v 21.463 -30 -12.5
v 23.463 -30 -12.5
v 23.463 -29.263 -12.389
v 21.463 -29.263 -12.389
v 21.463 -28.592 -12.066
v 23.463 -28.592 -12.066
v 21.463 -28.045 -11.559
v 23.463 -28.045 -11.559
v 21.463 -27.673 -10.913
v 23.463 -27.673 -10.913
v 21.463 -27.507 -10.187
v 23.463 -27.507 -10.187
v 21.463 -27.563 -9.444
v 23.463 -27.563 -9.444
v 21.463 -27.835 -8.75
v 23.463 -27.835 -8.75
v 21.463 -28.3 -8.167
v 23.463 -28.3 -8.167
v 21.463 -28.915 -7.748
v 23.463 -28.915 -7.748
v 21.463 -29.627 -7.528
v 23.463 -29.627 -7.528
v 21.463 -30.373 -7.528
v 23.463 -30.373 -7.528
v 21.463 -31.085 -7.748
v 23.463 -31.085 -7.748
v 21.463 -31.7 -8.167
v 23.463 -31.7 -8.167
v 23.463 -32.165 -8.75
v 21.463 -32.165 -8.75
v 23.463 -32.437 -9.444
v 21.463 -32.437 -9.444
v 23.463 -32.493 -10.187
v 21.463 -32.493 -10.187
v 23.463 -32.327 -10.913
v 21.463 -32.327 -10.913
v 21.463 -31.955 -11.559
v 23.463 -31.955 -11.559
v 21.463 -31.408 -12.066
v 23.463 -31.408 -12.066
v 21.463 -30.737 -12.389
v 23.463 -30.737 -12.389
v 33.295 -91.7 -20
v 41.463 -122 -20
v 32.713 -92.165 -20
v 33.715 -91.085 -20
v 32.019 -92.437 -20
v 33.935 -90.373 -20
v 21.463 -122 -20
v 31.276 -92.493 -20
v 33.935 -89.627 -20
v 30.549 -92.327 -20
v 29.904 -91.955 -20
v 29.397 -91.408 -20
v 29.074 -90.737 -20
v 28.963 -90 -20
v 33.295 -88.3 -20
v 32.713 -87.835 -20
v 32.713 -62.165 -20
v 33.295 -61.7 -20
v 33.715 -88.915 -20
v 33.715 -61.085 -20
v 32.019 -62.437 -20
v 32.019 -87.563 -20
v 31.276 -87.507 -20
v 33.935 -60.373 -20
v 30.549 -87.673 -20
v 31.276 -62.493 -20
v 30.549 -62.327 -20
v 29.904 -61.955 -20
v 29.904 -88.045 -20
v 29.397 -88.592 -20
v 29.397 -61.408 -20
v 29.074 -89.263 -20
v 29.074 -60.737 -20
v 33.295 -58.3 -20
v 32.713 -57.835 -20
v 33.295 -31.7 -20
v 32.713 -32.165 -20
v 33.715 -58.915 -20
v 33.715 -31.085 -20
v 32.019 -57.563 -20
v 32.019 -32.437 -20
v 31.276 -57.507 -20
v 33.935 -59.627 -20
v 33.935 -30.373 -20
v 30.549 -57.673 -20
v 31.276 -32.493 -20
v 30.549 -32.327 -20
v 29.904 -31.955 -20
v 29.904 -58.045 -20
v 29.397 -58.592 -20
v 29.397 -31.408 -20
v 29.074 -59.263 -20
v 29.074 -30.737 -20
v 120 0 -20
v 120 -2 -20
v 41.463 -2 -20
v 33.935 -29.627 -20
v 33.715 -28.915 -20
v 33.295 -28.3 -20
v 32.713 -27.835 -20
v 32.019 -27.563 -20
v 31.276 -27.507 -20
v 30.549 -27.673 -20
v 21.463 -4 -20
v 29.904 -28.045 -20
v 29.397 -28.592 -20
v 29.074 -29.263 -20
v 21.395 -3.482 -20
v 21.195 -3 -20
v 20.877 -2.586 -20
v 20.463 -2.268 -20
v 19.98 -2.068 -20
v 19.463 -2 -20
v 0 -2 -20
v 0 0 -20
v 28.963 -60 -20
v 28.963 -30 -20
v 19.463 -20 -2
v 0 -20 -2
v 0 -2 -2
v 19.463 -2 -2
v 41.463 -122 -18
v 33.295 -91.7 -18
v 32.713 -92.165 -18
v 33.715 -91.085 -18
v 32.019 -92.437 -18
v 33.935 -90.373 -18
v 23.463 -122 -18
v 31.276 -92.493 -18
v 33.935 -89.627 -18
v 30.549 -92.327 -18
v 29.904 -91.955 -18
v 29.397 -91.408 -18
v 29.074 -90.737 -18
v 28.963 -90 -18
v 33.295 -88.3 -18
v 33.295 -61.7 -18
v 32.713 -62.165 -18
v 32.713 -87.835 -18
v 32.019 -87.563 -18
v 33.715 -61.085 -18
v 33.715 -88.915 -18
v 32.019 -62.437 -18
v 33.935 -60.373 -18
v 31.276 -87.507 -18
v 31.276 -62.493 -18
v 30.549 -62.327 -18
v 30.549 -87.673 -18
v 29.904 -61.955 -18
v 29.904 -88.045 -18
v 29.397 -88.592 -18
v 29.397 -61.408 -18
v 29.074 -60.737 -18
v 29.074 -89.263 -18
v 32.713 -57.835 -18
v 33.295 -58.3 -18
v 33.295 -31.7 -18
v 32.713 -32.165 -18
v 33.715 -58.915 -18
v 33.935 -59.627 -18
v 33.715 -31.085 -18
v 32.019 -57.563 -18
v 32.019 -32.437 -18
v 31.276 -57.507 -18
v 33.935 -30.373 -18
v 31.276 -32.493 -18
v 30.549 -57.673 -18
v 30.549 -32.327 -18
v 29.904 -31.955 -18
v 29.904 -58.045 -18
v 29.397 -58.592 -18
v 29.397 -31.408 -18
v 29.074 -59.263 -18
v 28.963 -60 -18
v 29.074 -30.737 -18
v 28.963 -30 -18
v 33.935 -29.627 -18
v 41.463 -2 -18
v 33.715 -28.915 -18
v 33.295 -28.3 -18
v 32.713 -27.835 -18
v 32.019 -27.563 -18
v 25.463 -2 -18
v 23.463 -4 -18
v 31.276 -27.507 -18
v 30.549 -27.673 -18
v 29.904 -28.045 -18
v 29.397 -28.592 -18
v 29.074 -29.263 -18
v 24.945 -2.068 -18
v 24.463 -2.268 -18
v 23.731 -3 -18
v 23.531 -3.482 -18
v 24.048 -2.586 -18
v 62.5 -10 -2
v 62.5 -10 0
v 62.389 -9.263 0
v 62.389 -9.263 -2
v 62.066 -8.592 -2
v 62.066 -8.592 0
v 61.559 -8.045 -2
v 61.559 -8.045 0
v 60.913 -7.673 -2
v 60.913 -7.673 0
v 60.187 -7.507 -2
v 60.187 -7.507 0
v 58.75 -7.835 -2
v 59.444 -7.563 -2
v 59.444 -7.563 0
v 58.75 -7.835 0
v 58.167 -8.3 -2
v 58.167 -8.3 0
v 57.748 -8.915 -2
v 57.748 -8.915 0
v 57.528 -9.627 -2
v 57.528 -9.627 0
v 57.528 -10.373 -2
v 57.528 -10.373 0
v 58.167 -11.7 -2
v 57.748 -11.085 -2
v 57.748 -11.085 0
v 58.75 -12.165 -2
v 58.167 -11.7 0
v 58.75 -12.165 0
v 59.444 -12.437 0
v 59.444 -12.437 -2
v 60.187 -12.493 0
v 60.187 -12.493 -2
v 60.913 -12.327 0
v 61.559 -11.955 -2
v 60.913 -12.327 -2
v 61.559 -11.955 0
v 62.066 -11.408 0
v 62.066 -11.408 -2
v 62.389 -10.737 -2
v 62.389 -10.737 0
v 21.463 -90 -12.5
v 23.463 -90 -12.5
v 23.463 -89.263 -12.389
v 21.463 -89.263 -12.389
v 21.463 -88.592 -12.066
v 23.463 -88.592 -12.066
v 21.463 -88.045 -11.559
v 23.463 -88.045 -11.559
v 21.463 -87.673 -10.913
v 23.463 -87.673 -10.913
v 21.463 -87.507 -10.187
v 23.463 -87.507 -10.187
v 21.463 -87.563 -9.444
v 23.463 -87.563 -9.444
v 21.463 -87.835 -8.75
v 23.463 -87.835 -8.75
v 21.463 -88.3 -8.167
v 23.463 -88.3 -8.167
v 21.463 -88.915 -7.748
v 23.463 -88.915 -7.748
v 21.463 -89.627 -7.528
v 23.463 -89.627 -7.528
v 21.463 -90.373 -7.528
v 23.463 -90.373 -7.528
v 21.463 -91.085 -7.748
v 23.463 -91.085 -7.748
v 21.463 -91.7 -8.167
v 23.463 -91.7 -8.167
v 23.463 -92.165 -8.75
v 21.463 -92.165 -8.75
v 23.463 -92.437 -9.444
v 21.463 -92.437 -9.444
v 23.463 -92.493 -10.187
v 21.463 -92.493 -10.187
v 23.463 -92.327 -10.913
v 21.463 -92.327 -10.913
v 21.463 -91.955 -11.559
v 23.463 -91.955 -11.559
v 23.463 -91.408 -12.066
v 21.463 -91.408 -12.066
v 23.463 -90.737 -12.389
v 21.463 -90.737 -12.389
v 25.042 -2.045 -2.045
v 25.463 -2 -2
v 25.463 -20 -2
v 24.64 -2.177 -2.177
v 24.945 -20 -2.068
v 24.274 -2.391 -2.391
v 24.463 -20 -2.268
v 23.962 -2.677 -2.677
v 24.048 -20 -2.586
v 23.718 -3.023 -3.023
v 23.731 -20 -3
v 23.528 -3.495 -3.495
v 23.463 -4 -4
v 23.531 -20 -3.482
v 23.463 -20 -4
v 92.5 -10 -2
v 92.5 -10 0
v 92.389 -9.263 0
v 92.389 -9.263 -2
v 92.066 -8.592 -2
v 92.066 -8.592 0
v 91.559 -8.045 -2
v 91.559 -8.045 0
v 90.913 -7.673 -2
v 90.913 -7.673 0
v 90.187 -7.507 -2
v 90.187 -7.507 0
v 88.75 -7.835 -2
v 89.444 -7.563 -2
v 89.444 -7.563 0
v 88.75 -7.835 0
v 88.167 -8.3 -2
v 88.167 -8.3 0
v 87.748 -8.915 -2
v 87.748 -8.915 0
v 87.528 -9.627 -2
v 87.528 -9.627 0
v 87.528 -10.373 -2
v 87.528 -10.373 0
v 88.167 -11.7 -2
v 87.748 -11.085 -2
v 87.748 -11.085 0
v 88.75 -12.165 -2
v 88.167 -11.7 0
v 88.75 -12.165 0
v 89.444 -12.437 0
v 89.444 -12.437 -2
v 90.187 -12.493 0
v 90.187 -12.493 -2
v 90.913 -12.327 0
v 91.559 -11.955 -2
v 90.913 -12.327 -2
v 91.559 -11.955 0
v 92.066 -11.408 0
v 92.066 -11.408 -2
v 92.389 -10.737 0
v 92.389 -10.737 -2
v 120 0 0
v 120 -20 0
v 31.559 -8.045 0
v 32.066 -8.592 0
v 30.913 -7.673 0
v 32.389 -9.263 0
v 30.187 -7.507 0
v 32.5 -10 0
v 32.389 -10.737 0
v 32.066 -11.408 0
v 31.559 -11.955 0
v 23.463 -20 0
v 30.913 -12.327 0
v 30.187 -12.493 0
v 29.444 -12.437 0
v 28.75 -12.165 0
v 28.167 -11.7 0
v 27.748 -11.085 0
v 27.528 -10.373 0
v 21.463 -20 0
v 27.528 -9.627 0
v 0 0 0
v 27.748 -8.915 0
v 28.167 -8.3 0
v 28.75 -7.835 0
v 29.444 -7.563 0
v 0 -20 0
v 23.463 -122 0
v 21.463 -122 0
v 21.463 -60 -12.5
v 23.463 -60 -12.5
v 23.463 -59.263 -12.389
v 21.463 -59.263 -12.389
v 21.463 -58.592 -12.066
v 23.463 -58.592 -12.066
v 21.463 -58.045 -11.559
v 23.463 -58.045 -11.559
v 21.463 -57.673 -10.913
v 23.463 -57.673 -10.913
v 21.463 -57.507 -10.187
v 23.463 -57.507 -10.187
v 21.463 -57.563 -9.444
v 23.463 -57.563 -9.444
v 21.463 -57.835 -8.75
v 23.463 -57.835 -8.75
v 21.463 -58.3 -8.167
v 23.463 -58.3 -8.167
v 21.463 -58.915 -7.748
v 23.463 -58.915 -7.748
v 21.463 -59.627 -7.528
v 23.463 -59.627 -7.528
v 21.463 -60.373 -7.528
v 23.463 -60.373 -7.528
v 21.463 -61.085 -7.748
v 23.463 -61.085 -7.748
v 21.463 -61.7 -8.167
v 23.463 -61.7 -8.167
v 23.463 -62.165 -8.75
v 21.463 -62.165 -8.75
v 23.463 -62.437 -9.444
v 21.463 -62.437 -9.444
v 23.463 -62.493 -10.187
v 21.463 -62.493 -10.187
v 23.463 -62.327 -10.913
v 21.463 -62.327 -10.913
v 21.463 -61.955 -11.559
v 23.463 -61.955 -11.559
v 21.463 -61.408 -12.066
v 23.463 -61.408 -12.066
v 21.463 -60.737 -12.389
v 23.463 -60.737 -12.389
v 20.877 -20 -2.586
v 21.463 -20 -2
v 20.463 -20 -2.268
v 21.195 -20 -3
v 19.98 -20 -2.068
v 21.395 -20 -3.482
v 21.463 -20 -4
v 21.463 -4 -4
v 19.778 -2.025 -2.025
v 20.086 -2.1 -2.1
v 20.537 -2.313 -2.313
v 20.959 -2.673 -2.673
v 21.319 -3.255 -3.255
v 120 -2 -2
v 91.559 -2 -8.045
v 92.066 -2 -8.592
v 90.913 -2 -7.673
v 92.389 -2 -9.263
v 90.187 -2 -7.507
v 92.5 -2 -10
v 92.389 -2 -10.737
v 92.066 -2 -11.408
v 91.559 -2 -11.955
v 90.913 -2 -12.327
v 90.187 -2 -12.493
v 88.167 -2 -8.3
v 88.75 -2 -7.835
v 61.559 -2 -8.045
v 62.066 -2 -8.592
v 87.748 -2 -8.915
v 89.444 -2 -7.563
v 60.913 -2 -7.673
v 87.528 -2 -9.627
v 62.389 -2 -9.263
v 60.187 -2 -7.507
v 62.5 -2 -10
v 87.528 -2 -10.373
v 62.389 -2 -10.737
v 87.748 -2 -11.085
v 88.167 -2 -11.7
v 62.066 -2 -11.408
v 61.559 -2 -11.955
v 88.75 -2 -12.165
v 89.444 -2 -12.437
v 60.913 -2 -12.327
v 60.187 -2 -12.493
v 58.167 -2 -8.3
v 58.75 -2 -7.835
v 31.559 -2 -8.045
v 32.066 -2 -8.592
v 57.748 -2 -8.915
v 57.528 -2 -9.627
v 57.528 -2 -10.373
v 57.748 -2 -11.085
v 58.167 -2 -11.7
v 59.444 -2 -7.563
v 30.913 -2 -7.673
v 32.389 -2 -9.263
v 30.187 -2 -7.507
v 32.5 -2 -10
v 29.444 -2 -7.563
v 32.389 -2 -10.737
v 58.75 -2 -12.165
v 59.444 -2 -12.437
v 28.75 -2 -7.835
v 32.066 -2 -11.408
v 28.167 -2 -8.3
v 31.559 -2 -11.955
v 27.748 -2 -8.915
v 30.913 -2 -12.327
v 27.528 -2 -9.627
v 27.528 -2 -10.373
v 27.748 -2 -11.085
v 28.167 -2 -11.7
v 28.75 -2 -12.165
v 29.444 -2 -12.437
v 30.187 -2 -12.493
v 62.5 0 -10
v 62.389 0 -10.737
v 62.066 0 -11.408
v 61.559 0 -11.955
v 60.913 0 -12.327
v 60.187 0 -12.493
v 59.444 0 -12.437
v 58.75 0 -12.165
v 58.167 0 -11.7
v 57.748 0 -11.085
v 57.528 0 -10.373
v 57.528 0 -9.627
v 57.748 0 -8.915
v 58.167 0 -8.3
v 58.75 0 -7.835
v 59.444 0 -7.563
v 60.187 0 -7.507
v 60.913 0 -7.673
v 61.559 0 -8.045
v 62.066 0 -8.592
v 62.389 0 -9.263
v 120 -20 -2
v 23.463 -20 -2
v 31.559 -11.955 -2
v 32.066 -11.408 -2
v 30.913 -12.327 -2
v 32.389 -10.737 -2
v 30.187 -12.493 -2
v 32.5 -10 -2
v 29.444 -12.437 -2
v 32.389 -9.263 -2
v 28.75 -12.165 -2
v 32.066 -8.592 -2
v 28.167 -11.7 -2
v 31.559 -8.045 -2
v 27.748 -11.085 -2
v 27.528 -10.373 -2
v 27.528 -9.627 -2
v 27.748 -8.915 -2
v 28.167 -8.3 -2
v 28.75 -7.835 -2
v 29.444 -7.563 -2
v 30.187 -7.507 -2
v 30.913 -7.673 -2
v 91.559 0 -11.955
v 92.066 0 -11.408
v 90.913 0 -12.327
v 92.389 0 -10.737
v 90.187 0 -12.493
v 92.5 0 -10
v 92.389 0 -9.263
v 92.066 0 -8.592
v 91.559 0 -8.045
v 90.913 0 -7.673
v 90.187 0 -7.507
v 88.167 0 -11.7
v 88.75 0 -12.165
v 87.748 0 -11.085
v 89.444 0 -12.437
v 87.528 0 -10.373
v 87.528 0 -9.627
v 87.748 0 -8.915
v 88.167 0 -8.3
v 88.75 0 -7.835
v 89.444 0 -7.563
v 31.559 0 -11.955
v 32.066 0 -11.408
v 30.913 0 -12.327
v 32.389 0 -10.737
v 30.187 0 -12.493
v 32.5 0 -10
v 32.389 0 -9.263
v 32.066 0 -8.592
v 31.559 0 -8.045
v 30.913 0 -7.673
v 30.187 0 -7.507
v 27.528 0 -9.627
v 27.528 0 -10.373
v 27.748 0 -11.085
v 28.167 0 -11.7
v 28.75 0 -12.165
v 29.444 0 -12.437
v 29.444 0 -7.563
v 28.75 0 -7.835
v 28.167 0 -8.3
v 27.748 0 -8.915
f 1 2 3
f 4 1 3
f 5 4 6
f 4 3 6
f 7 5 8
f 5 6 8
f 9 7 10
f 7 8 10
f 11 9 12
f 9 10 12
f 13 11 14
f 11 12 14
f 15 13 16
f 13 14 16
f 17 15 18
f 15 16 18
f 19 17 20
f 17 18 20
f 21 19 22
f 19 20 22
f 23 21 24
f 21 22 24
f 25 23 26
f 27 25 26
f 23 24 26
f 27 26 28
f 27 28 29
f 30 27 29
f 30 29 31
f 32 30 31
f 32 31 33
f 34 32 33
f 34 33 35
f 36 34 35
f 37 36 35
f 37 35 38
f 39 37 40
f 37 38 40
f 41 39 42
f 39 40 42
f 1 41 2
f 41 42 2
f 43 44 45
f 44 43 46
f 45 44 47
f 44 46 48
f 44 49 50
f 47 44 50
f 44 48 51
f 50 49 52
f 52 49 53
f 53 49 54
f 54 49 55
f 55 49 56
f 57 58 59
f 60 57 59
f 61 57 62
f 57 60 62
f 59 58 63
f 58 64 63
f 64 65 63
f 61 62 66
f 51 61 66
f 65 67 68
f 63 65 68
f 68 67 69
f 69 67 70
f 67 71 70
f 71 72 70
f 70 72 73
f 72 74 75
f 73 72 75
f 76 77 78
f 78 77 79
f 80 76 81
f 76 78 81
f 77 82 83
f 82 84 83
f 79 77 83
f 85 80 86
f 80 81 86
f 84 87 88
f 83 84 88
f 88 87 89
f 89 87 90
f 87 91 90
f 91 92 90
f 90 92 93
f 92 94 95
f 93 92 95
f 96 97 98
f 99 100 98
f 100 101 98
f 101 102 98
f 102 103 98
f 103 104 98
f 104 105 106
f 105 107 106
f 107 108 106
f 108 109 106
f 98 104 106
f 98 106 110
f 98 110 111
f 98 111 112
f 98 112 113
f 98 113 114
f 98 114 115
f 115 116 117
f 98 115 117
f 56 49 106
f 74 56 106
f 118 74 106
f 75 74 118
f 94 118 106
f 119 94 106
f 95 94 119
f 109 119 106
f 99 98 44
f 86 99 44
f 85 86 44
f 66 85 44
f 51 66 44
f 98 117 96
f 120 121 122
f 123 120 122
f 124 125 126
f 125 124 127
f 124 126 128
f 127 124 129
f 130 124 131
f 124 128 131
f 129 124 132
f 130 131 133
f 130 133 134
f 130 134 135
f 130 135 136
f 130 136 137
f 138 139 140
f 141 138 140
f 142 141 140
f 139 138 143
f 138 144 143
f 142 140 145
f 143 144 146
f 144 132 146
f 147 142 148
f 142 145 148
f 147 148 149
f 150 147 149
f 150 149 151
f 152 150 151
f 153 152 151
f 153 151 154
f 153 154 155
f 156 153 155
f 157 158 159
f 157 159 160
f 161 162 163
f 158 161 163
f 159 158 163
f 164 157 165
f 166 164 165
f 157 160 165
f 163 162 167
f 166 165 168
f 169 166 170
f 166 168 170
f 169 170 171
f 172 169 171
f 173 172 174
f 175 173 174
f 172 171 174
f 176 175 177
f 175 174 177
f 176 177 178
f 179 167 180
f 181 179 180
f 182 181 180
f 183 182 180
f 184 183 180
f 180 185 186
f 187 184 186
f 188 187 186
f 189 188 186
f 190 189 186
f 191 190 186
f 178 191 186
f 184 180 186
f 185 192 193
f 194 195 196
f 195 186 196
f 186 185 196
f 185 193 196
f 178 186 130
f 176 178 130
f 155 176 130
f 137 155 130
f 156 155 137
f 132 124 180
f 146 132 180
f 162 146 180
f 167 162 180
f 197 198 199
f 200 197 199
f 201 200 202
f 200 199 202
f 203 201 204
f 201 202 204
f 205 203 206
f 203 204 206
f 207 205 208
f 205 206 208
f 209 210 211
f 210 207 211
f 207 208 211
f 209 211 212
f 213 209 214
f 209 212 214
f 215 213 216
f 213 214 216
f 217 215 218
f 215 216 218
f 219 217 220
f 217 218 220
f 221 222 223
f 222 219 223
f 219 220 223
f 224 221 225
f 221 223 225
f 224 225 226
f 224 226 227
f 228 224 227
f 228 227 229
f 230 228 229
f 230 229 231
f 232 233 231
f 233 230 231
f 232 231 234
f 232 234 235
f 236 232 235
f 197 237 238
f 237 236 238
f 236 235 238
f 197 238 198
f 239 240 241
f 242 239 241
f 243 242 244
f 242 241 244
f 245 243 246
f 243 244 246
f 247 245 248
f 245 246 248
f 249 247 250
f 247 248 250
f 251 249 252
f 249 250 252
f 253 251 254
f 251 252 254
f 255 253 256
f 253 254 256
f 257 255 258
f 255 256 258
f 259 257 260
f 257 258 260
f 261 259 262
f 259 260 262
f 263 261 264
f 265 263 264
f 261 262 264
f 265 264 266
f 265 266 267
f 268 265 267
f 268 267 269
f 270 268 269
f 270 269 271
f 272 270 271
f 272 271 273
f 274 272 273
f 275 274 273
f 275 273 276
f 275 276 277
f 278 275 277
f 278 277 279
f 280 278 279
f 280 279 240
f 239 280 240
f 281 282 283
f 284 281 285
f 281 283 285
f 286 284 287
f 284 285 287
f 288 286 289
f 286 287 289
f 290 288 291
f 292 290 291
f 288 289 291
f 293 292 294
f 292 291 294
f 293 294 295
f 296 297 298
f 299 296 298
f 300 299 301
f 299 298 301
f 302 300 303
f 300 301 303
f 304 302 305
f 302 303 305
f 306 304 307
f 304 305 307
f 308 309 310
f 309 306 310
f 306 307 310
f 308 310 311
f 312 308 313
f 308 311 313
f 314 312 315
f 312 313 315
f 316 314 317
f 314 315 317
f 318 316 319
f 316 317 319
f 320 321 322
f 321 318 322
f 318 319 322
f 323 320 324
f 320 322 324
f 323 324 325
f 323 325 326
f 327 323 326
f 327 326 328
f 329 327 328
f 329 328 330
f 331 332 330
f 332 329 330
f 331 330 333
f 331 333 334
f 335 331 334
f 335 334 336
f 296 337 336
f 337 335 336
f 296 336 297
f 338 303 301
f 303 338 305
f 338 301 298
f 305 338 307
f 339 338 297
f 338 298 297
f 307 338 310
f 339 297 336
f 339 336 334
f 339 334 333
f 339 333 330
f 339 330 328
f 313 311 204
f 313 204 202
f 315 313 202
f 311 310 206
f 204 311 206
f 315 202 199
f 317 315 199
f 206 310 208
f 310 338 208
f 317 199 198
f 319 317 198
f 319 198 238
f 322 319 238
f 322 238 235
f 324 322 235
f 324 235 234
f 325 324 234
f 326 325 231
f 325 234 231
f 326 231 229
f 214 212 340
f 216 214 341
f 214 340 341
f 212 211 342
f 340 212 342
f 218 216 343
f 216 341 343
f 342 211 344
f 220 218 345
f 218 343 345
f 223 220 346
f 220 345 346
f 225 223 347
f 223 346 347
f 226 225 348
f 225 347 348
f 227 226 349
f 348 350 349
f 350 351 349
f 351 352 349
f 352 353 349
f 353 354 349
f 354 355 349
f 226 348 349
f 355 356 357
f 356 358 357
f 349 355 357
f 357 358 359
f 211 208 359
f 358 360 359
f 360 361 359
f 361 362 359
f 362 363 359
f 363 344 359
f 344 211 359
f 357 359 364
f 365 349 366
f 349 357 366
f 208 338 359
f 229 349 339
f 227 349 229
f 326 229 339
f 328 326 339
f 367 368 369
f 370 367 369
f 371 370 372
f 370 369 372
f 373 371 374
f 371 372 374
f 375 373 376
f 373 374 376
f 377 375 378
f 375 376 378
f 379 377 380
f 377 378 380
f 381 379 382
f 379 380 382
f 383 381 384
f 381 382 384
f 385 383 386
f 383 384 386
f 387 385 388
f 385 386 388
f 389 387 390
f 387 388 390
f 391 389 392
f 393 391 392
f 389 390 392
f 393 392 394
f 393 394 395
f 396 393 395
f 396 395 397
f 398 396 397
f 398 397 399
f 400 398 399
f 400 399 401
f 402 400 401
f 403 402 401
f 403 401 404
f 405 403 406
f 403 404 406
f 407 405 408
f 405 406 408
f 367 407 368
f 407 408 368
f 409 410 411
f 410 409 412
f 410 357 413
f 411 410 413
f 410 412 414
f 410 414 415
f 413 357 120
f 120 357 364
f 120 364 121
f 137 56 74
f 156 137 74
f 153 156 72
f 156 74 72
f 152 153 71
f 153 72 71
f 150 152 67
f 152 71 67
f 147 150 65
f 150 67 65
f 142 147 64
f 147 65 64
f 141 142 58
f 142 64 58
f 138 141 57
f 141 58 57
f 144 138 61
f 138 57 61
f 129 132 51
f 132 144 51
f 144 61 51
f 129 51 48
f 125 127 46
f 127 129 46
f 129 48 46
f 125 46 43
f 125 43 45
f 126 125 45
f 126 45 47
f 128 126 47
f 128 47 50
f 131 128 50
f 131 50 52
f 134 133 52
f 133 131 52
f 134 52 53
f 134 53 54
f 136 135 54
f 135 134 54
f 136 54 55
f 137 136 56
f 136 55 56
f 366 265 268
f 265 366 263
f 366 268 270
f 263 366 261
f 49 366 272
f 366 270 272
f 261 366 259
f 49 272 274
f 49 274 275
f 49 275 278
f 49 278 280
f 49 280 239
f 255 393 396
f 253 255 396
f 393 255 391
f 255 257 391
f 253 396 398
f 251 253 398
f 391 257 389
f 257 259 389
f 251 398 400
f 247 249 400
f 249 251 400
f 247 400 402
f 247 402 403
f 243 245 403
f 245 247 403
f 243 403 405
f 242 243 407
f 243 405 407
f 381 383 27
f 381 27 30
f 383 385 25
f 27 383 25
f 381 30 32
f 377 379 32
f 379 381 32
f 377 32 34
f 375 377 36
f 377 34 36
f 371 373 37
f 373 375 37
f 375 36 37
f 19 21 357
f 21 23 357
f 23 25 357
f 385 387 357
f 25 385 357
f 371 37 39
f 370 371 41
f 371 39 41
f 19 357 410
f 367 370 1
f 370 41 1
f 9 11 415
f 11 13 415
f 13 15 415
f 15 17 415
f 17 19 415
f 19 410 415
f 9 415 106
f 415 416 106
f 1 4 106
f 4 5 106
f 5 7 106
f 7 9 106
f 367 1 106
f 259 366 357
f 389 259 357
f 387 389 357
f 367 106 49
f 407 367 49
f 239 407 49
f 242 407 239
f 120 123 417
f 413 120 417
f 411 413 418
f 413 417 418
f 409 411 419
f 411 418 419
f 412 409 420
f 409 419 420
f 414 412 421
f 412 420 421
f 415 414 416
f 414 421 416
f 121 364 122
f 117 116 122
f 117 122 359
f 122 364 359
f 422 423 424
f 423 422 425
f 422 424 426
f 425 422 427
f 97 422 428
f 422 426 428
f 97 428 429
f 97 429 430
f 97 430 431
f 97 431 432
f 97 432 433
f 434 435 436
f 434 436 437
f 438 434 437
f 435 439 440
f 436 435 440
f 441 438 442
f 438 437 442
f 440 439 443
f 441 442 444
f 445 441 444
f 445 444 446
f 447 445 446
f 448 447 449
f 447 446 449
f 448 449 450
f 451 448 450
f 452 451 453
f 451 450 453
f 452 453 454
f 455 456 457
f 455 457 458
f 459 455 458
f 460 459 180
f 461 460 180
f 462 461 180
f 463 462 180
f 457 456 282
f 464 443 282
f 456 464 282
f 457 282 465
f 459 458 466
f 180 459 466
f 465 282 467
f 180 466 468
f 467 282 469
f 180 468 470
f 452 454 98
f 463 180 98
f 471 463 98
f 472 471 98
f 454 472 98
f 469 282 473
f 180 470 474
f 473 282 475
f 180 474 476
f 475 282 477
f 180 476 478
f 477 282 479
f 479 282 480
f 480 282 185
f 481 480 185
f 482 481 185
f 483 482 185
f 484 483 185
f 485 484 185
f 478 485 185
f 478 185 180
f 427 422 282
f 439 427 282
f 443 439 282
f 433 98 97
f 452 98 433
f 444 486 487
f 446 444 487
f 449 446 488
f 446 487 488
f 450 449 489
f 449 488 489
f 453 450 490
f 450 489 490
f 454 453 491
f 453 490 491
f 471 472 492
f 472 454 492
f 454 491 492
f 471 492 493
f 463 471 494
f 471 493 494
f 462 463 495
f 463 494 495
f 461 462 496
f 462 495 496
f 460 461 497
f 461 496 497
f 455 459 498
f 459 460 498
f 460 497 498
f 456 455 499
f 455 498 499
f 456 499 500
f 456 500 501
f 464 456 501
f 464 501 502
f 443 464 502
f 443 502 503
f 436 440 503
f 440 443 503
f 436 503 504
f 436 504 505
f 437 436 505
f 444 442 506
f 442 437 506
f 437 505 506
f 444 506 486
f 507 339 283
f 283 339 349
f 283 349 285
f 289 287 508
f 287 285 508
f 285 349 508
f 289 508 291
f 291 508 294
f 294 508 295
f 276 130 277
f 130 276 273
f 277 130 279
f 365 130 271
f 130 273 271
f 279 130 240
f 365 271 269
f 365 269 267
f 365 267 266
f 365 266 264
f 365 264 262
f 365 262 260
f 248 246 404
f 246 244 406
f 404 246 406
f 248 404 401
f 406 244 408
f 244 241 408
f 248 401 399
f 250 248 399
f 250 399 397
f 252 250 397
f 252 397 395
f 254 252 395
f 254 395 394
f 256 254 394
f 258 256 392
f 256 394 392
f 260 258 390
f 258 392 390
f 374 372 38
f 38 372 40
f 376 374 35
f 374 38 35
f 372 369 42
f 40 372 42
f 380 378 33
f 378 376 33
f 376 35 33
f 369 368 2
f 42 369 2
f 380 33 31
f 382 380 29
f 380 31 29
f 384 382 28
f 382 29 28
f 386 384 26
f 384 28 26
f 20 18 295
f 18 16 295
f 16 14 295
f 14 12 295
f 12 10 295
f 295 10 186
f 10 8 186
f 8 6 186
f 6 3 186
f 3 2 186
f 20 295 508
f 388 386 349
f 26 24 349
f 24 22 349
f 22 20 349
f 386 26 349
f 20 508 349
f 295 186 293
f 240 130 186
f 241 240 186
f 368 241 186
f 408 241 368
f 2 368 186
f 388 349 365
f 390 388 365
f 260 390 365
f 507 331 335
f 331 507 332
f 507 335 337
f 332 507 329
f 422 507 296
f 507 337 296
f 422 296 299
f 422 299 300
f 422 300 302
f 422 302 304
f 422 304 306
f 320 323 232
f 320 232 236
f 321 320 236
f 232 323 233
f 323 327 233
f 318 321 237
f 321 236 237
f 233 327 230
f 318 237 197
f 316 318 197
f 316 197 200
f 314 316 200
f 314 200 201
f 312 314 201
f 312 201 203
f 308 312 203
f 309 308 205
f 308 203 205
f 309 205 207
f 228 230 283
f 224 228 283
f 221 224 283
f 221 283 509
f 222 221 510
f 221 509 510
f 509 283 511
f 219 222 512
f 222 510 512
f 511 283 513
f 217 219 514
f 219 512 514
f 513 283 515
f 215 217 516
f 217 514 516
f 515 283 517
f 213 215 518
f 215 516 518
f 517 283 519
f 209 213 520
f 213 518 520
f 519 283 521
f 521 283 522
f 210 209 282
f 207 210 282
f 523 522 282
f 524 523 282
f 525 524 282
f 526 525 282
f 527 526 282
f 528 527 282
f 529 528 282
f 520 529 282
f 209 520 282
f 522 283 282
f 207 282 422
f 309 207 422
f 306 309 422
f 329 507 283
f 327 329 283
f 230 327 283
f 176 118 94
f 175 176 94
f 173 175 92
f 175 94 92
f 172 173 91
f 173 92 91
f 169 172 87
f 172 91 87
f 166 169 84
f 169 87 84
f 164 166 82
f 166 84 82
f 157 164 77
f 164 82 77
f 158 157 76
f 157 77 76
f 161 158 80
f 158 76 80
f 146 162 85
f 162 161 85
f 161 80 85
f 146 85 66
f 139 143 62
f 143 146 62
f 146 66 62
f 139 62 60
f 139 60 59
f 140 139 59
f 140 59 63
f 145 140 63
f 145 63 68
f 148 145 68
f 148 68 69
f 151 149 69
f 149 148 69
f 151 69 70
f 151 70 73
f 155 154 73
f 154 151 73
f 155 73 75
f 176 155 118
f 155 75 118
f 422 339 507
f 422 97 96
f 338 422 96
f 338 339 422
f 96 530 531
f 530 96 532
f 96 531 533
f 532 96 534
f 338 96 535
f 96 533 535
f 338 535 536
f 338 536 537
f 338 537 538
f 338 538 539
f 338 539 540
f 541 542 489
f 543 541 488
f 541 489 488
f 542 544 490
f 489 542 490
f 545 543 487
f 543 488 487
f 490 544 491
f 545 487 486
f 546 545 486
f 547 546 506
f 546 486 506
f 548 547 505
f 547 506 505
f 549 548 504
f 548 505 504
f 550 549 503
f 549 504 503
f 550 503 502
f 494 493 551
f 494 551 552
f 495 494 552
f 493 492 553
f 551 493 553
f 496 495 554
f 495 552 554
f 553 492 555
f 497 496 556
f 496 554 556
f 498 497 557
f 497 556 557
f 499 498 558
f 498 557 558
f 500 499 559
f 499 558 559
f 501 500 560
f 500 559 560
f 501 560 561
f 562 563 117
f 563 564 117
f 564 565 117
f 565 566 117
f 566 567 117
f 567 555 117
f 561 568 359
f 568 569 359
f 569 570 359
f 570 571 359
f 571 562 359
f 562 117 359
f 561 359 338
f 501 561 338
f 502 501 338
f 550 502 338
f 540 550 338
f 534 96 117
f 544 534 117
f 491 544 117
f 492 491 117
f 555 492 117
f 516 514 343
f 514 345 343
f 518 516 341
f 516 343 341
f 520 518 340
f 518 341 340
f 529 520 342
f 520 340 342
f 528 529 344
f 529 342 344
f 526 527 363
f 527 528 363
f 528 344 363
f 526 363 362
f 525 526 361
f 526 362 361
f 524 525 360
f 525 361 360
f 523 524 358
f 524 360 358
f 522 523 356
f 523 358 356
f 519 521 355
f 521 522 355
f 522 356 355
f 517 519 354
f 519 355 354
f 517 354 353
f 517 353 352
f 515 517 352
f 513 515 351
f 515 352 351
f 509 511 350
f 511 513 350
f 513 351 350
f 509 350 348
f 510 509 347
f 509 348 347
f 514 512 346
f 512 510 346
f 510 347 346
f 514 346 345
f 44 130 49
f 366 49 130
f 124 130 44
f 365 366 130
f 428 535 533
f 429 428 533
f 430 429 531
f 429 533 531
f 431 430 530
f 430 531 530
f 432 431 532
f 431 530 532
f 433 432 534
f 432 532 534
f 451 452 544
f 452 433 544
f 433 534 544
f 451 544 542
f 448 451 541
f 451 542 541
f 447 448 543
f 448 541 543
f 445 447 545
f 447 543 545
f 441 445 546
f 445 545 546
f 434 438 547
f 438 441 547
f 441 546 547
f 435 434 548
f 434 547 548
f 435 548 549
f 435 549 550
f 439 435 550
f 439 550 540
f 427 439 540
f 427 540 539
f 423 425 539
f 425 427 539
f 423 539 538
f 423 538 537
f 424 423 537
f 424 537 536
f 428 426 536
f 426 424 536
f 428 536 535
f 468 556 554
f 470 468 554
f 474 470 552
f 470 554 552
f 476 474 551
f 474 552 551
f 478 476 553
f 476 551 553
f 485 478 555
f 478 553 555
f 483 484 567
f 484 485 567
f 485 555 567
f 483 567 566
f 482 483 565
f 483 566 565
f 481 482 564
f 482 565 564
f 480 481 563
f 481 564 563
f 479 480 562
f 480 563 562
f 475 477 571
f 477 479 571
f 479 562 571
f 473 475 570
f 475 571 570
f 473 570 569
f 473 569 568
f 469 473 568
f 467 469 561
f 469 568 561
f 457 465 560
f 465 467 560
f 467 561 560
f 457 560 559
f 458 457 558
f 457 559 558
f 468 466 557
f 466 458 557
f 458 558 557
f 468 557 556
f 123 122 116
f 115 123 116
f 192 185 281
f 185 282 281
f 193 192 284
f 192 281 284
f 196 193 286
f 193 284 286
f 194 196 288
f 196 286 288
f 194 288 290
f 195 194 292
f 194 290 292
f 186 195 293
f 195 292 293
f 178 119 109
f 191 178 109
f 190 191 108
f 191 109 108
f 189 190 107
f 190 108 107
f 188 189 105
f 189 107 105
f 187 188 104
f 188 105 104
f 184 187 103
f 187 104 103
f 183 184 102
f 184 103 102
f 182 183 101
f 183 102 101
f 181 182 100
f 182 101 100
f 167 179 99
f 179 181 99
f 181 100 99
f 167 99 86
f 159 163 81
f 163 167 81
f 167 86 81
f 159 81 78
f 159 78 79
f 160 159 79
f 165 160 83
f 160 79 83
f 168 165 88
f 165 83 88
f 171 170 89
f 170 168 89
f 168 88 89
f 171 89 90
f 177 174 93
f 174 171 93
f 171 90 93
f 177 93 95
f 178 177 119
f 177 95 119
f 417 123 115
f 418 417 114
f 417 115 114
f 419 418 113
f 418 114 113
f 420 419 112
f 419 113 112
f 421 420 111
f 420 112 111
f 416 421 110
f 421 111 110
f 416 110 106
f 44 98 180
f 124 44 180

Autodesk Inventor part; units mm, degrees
ref_plane "YZ Plane" through (0, 0, 0) normal (1, 0, 0) x (0, 1, 0)
ref_plane "XZ Plane" through (0, 0, 0) normal (0, 1, 0) x (-1, 0, 0)
ref_plane "XY Plane" through (0, 0, 0) normal (0, 0, 1) x (1, 0, 0)
sketch "Sketch1" plane through (0, 0, 0) normal (1, 0, 0) x (0, 1, 0)
  line L0 (0, 0) -> (-20, 0)
  line L1 (-20, 0) -> (-20, -2)
  line L2 (-20, -2) -> (0, -2)
  line L3 (0, -2) -> (0, 0)
  line L4 (0, 0) -> (-2, 0)
  line L5 (-2, 0) -> (-2, -20)
  line L6 (-2, -20) -> (0, -20)
  line L7 (0, -20) -> (0, 0)
  dimension "d0" = 20
  dimension "d1" = 2
  dimension "d2" = 2
  dimension "d3" = 20
extrude "Extrusion1" add sketch "Sketch1" along normal blind 120
sketch "Sketch2" plane through (0, 0, 0) normal (0, 1, 0) x (1, 0, 0)
  line L0 (0, 20) -> (0, 0) projected
  line L1 (0, 0) -> (0, 10)
  line L2 (0, 10) -> (30, 10)
  circle A0 centre (30, 10) radius 2.5
  dimension "d6" = 10
  dimension "d7" = 30
  dimension "d8" = 5
extrude "Extrusion2" cut sketch "Sketch2" against normal blind 120
pattern_linear "Rectangular Pattern1" count 3 spacing 30 along (1, 0, 0) of "Extrusion2"
sketch "Sketch3" plane through (0, -20, 0) normal (0, 0, 1) x (1, 0, 0)
  line L0 (0, 0) -> (0, 18) projected
  line L1 (0, 0) -> (0, 10)
  line L2 (0, 10) -> (30, 10)
  circle A0 centre (30, 10) radius 2.5
  point P0 (0, 20)
  dimension "d14" = 10
  dimension "d15" = 30
  dimension "d16" = 5
extrude "Extrusion3" cut sketch "Sketch3" against normal blind 120
pattern_linear "Rectangular Pattern2" count 3 spacing 30 along (1, 0, 0) of "Extrusion3"
sketch "Sketch4" plane through (0, -2, -20) normal (0, -1, 0) x (1, 0, 0)
  line L0 (0, 0) -> (120, 0) projected
  line L1 (21.4627, 0) -> (41.4627, 0)
  line L2 (41.4627, 0) -> (41.4627, 2)
  line L3 (41.4627, 2) -> (21.4627, 2)
  line L4 (21.4627, 2) -> (21.4627, 0)
  line L5 (21.4627, 0) -> (23.4627, 0)
  line L6 (23.4627, 0) -> (23.4627, 20)
  line L7 (23.4627, 20) -> (21.4627, 20)
  line L8 (21.4627, 20) -> (21.4627, 0)
  point P0 (0, 20)
  dimension "d22" = 20
  dimension "d23" = 2
  dimension "d24" = 2
extrude "Extrusion4" add sketch "Sketch4" along normal blind 120
sketch "Sketch5" plane through (23.4627, -2, -2) normal (1, 0, 0) x (0, 0, -1)
  line L0 (0, -18) -> (0, 0) projected
  line L1 (-2, -18) -> (0, -18) projected
  line L2 (-2, -18) -> (-2, -120) projected
  line L3 (16, -120) -> (-2, -120) projected
  line L4 (16, -120) -> (16, 0) projected
  line L5 (0, 0) -> (16, 0) projected
  line L6 (-2, 2) -> (-2, -18) projected
  line L7 (-2, -18) -> (0, -18) projected
  line L8 (0, -18) -> (0, 0) projected
  line L9 (0, 0) -> (18, 0) projected
  line L10 (18, 0) -> (18, 2) projected
  line L11 (18, 2) -> (-2, 2) projected
  line L12 (18, 2) -> (-2, 2) projected
  line L13 (-2, 2) -> (8, 2)
  line L14 (8, 2) -> (8, -28)
  circle A0 centre (8, -28) radius 2.5
  dimension "d27" = 30
  dimension "d28" = 5
extrude "Extrusion5" cut sketch "Sketch5" against normal blind 120 contours A0
pattern_linear "Rectangular Pattern3" count 3 spacing 30 along (0, -1, 0) of "Extrusion5"
sketch "Sketch6" plane through (120, 0, -20) normal (0, 0, -1) x (-1, 0, 0)
  line L0 (98.5373, -2) -> (98.5373, -122) projected
  line L1 (98.5373, -2) -> (98.5373, 0)
  line L2 (98.5373, 0) -> (88.5373, 0)
  line L3 (120, 0) -> (0, 0) projected
  line L4 (88.5373, 0) -> (88.5373, -30)
  circle A0 centre (88.5373, -30) radius 2.5
  dimension "d34" = 10
  dimension "d35" = 30
  dimension "d36" = 5
extrude "Extrusion6" cut sketch "Sketch6" against normal blind 120
pattern_linear "Rectangular Pattern4" count 3 spacing 30 along (0, -1, 0) of "Extrusion6"
fillet "Fillet1" radius 2 2 edges at (21.4627, -11, -2) (21.4627, -2, -11)
fillet "Fillet2" radius 2 2 edges at (23.4627, -2, -10) (23.4627, -11, -2)
properties part number "lol"
